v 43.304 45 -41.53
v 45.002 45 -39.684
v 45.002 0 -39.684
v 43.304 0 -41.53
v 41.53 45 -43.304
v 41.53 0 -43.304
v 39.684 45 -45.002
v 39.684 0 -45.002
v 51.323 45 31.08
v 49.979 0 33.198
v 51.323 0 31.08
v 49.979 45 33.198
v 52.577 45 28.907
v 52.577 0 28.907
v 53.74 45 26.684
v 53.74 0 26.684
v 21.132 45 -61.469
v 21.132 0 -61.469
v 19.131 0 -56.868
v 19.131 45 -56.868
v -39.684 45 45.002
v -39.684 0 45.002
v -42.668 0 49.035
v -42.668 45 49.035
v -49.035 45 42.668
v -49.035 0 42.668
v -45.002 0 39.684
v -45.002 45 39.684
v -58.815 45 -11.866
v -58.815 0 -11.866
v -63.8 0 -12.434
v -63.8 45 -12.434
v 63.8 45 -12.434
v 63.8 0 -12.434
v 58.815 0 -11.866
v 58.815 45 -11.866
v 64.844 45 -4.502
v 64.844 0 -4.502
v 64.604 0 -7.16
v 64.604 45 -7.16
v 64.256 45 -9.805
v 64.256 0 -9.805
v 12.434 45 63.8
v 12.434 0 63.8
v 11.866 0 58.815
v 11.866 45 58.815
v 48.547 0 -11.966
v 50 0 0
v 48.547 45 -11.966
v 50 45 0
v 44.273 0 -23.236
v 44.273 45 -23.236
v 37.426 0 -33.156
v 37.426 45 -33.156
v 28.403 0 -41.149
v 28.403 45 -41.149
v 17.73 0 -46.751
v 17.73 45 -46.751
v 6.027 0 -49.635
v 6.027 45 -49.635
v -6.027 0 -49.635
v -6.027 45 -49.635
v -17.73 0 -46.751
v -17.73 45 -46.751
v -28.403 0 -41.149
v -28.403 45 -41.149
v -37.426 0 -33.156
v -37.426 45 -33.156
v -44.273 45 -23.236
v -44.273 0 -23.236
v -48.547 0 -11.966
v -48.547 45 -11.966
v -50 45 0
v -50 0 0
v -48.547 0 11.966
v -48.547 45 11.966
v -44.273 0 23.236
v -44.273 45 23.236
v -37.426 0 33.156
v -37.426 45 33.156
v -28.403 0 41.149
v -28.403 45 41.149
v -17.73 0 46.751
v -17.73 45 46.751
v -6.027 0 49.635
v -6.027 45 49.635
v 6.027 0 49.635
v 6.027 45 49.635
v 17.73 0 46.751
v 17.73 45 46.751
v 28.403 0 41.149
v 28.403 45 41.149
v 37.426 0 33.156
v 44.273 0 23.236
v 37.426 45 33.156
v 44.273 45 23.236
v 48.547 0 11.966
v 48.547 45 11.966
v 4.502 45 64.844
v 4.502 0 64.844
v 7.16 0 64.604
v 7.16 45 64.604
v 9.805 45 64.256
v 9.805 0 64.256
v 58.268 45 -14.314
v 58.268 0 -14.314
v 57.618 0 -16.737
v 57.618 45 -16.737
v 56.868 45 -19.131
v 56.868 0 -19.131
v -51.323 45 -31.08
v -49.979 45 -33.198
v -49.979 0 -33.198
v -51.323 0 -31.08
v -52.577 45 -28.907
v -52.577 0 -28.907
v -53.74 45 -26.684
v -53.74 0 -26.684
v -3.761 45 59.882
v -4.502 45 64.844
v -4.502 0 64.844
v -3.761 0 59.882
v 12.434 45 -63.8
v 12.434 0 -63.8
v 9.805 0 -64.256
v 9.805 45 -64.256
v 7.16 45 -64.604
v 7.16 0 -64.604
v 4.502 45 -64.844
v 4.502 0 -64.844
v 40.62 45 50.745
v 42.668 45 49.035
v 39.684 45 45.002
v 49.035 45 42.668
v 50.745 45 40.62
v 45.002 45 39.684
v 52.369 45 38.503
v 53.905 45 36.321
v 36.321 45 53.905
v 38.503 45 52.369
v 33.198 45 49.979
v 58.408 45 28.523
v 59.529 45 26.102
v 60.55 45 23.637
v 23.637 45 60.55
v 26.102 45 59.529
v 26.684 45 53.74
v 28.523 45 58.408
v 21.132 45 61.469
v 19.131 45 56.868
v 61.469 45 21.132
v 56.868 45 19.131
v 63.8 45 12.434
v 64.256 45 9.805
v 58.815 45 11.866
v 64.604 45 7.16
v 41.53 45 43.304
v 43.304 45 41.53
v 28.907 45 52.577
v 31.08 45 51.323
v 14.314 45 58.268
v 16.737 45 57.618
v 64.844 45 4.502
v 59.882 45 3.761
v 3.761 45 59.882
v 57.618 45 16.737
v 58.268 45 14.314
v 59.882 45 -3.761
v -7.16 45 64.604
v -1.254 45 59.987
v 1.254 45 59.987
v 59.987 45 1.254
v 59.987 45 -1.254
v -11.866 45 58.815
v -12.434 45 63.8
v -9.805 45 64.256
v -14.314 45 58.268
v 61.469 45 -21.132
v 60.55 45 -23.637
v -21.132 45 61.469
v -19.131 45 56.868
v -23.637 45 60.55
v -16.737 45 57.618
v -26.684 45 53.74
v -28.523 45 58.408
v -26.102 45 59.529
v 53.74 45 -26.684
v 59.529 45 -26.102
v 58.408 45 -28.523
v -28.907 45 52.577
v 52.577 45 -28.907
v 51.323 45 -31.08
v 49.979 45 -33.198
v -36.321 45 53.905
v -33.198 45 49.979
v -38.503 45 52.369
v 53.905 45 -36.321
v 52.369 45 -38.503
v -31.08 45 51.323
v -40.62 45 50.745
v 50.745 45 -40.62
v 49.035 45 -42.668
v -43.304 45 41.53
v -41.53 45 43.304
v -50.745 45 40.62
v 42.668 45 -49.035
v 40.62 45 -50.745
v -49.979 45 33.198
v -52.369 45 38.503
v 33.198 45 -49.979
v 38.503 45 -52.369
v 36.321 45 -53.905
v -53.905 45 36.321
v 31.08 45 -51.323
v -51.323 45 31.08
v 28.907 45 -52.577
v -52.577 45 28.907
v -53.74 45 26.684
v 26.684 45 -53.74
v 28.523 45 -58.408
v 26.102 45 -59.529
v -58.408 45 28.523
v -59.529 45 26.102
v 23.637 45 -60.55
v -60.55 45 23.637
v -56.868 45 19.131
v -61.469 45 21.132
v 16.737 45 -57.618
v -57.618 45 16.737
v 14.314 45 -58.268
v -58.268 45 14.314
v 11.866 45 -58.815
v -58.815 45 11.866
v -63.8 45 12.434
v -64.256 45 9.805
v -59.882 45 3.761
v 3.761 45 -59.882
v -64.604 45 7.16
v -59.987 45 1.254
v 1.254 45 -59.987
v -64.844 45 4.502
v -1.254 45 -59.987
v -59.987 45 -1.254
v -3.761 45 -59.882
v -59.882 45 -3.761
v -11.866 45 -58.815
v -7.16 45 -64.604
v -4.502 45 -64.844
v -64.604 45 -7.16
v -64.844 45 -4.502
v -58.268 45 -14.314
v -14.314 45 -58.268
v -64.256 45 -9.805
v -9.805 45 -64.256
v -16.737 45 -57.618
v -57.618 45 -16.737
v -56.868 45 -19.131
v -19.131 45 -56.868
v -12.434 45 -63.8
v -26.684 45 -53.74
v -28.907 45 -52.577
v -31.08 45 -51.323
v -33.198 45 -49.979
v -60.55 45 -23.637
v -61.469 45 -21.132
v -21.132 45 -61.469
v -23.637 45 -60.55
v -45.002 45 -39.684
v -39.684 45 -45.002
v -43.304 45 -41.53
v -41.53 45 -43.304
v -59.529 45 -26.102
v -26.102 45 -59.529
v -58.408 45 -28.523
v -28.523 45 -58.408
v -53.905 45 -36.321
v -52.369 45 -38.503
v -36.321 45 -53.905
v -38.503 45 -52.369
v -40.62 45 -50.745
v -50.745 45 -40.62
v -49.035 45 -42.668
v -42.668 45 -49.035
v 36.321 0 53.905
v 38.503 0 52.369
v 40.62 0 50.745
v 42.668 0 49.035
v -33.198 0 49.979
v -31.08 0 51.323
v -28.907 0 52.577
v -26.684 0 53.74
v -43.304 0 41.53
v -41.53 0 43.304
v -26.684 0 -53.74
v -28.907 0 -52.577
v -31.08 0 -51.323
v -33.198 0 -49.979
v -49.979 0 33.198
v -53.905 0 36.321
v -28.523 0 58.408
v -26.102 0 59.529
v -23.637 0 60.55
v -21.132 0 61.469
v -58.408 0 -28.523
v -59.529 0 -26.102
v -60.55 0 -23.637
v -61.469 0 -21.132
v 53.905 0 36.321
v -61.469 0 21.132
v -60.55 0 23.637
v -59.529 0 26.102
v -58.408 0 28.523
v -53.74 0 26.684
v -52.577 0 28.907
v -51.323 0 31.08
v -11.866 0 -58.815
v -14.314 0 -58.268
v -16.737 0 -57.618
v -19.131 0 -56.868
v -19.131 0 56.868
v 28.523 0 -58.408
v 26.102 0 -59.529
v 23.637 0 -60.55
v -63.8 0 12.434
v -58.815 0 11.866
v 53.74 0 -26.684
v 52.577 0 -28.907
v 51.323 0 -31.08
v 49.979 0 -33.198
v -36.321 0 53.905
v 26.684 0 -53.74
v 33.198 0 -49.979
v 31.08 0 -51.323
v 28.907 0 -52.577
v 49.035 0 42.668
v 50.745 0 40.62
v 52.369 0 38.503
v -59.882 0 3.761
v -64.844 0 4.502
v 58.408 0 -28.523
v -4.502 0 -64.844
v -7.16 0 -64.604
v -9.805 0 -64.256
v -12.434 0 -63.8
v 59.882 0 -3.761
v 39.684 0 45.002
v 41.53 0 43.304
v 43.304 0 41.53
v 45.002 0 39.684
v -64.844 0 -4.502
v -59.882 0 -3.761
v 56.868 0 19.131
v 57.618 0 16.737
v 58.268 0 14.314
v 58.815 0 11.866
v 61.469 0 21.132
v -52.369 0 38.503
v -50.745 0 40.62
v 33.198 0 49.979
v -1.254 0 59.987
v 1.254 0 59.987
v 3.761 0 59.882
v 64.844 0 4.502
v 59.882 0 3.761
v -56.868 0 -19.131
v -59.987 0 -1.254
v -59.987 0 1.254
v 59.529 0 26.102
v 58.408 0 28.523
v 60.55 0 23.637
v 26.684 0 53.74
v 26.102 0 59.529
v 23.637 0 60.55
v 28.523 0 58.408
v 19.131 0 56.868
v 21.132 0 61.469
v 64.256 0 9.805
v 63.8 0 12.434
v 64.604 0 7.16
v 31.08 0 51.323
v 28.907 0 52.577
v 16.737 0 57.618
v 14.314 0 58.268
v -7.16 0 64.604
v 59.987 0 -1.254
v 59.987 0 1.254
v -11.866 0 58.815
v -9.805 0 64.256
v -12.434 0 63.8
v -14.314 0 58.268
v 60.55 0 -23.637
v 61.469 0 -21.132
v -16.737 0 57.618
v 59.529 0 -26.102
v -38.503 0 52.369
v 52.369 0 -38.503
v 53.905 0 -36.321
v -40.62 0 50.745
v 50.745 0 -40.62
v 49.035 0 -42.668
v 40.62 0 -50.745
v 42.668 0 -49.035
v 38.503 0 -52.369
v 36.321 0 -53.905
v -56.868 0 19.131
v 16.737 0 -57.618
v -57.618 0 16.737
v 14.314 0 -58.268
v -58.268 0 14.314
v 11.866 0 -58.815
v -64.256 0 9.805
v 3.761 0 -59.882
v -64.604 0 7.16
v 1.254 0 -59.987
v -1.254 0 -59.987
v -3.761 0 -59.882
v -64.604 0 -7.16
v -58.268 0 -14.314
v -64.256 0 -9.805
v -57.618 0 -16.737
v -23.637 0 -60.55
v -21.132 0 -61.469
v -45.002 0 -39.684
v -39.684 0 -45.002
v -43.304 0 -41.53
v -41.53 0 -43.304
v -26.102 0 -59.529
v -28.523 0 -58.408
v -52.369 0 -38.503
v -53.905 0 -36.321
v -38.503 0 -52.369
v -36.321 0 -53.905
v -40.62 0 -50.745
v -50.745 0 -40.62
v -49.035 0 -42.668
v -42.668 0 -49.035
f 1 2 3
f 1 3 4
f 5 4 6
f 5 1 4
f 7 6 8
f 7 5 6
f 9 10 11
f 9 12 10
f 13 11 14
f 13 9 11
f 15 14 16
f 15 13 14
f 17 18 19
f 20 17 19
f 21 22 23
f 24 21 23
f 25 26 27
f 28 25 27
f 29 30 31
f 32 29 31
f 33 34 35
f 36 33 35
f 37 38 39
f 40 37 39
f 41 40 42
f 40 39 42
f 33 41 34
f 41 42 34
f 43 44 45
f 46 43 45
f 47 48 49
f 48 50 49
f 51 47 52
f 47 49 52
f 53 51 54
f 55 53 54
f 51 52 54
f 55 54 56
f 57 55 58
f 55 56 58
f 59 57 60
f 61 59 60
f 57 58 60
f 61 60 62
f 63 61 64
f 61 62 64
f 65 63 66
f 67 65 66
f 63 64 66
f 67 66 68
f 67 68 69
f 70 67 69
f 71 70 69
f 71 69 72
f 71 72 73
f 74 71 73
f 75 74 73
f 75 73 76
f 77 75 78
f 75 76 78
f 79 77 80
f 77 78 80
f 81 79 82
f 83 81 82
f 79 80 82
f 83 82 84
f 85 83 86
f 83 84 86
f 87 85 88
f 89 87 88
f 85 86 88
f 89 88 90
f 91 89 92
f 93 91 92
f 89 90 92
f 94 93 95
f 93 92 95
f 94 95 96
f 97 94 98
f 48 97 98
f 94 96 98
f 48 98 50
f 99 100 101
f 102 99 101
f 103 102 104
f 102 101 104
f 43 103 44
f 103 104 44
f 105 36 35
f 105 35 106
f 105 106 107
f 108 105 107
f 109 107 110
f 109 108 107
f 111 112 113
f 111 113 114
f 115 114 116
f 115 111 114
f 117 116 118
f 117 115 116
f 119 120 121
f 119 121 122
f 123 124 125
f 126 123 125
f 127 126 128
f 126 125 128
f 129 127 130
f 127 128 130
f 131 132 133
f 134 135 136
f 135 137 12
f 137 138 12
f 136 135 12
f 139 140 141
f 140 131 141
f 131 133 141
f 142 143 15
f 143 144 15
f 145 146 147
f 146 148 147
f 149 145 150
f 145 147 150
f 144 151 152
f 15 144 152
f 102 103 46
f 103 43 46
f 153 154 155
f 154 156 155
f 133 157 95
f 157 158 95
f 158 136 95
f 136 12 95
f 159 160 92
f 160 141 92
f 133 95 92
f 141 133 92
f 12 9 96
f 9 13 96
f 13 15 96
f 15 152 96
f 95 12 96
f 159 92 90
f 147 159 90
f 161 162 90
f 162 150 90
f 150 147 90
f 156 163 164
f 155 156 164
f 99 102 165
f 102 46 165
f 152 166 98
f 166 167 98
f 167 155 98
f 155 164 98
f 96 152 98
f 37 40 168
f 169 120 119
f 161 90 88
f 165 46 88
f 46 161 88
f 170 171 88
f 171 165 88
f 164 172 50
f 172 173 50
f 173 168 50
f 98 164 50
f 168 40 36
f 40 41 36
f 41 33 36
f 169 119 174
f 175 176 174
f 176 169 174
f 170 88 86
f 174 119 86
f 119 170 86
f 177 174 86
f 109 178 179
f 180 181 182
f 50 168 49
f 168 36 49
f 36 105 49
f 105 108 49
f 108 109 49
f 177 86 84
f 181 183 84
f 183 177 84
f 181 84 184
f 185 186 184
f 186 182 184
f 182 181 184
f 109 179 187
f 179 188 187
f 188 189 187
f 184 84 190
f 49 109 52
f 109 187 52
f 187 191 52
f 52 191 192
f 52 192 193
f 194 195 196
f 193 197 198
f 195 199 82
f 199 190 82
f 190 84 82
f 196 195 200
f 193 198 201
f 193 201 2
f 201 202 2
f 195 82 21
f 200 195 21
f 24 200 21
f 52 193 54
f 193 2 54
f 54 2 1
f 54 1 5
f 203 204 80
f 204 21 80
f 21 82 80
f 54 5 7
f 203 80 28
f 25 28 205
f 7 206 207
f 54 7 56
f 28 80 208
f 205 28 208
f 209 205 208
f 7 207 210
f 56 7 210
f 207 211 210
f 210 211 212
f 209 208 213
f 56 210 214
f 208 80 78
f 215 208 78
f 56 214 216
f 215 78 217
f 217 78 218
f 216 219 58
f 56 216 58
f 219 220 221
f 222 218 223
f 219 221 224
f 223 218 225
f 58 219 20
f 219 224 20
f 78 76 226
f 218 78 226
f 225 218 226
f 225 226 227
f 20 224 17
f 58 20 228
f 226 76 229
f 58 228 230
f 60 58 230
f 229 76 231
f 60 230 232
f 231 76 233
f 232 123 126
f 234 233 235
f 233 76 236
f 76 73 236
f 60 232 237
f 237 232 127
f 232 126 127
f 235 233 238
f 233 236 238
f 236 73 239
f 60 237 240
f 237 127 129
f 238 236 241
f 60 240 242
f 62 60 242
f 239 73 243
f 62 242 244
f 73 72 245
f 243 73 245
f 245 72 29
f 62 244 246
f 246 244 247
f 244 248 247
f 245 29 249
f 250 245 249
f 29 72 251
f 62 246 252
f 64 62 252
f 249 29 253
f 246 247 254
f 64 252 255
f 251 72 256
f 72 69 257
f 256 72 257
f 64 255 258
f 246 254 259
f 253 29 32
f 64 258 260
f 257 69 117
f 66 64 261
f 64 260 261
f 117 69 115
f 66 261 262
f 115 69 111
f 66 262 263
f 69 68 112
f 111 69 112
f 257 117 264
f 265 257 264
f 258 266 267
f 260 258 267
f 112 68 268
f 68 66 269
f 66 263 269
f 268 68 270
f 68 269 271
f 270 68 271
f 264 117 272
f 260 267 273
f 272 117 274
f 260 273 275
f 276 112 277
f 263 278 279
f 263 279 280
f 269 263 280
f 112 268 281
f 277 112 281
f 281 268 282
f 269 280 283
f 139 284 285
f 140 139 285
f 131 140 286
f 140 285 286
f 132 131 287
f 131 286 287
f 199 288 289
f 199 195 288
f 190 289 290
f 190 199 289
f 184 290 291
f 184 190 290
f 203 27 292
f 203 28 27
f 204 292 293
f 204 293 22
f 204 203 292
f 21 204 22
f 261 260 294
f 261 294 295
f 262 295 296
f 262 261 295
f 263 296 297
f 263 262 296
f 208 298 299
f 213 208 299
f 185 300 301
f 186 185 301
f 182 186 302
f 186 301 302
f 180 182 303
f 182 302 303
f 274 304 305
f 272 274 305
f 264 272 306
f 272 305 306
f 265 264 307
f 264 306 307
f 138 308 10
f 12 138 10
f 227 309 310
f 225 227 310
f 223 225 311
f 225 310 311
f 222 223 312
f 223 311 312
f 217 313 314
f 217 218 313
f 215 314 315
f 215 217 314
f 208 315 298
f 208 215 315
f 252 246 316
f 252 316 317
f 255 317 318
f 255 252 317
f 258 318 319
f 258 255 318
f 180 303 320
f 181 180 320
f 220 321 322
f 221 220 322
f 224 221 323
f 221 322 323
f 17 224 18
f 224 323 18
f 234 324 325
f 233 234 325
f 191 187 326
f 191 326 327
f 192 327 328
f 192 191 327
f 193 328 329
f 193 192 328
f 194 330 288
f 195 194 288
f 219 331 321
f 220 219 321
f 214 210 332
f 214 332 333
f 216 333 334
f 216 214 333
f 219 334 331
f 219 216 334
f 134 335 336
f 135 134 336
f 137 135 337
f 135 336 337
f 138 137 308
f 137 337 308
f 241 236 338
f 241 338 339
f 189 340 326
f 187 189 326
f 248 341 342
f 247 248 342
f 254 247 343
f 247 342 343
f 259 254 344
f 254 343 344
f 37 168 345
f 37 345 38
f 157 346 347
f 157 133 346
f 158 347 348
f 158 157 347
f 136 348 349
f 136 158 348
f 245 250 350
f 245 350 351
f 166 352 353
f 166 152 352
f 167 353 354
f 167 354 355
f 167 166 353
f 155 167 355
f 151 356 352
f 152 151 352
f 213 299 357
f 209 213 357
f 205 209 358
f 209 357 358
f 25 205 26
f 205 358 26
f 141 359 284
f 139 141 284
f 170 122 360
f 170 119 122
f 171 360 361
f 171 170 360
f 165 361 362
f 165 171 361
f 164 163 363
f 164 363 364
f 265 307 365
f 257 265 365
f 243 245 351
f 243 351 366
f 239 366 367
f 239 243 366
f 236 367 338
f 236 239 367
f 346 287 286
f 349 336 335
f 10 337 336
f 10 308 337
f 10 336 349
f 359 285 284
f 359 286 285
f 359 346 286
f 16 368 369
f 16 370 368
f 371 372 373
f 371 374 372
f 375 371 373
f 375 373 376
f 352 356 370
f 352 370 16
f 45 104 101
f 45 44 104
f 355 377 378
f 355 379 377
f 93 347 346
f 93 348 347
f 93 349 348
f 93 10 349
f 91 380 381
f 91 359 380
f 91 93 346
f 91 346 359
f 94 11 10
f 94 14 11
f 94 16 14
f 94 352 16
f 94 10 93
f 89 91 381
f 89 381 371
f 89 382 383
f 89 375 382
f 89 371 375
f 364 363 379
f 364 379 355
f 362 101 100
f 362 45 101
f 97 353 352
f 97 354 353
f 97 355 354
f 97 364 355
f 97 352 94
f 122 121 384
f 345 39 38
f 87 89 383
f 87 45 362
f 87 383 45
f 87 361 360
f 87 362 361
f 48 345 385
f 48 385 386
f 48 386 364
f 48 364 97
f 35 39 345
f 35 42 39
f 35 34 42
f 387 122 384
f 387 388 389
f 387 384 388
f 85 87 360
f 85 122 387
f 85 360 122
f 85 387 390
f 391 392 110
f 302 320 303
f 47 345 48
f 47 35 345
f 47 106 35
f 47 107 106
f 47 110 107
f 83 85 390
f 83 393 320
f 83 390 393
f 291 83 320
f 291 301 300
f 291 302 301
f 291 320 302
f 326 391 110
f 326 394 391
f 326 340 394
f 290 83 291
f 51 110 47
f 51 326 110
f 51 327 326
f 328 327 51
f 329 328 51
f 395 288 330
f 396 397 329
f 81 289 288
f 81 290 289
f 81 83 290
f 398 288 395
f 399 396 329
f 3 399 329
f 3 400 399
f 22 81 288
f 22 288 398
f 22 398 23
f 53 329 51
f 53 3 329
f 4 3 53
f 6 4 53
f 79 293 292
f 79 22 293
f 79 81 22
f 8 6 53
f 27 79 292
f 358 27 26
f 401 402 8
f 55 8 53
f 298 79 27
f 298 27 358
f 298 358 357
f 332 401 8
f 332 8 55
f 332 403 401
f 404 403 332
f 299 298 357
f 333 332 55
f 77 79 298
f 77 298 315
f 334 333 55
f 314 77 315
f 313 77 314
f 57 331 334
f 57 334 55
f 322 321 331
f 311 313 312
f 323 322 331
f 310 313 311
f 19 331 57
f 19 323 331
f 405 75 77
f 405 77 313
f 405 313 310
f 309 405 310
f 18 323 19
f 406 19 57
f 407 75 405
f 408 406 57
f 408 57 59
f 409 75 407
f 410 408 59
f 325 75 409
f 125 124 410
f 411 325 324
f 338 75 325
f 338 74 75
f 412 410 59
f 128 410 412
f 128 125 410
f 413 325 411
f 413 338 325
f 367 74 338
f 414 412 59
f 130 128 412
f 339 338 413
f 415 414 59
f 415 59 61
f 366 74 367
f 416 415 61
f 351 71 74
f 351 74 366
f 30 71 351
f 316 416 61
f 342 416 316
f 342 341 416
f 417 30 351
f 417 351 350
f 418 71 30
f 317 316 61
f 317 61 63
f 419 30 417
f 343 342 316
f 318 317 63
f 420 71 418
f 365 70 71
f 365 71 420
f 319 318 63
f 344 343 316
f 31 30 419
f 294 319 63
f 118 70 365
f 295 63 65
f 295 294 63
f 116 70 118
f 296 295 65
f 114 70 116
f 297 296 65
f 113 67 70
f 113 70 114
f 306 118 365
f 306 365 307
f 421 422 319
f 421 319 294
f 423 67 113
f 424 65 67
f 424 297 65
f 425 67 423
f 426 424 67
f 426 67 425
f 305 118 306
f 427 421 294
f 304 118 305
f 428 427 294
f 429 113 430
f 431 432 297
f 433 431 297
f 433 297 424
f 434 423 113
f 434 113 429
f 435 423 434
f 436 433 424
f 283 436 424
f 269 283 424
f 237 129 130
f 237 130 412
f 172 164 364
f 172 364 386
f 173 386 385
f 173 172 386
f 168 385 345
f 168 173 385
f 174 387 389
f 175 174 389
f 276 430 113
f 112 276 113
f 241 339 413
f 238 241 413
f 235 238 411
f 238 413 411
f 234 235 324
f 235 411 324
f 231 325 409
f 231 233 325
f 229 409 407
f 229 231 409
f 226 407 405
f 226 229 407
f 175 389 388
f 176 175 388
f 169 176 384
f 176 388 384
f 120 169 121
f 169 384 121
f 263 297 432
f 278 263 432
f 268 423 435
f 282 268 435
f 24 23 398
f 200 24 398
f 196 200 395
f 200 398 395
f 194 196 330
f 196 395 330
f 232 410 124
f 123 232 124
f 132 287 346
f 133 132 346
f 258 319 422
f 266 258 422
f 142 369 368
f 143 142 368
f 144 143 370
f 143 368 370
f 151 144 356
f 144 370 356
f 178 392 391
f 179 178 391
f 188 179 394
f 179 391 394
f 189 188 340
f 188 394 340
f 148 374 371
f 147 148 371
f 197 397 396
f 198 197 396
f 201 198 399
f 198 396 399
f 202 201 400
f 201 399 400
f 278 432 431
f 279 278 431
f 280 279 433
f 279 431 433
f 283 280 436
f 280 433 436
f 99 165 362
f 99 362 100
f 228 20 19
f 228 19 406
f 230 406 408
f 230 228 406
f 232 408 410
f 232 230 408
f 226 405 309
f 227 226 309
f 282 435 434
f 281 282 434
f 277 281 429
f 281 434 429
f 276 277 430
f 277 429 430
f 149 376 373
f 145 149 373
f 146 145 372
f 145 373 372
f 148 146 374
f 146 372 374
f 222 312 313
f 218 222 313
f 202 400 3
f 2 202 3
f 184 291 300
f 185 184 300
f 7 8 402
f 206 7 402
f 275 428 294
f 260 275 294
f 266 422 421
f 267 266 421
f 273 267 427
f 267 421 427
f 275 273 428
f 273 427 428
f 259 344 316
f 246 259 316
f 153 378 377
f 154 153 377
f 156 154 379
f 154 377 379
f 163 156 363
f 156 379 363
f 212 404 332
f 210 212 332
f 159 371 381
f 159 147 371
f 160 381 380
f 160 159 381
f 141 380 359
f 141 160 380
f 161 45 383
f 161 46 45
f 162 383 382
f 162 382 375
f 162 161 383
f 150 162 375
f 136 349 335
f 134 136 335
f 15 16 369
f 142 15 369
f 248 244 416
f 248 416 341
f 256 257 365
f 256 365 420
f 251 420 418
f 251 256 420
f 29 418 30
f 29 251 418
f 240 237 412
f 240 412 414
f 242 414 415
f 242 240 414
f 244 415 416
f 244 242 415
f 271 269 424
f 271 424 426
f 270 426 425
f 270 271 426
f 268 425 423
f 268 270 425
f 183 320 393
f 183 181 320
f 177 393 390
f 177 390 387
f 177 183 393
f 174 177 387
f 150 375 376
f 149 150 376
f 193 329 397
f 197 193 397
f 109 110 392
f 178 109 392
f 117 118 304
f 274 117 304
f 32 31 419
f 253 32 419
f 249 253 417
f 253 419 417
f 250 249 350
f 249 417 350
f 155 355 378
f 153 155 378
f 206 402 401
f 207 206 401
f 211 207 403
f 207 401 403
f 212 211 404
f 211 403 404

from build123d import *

# Parameters (mm, degrees)
SKETCH2_W           = 10
SKETCH2_H           = 45
BOSS_EXTRUDE1_DEPTH = 45


with BuildPart() as part:
    # Sketch2 → Revolve1 (revolve)
    with BuildSketch(Plane.XY):
        with Locations((55, 22.5)):
            Rectangle(SKETCH2_W, SKETCH2_H)
    revolve(axis=Axis((0, -1000, 0), (0, 1, 0)))

    # Sketch3 → Boss-Extrude1 (add)
    with BuildSketch(Plane(origin=(0, 0, 0), x_dir=(1, 0, 0), z_dir=(0, 1, 0))):
        with BuildLine():
            Line((4.502343049, 64.84388103), (3.76078814, 59.88202128))
            ThreePointArc((3.76078814, 59.88202128), (7.831571533, 59.486691682), (11.865965175, 58.81495448))
            Line((11.865965175, 58.81495448), (12.43390194, 63.799671493))
            ThreePointArc((12.43390194, 63.799671493), (8.484202494, 64.443915989), (4.502343049, 64.84388103))
        make_face()
        with BuildLine():
            Line((21.131760798, 61.469087235), (19.131249958, 56.868227289))
            ThreePointArc((19.131249958, 56.868227289), (22.961005942, 55.432771951), (26.684072572, 53.739745728))
            Line((26.684072572, 53.739745728), (28.522797059, 58.407619777))
            ThreePointArc((28.522797059, 58.407619777), (24.874423104, 60.052169613), (21.131760798, 61.469087235))
        make_face()
        with BuildLine():
            Line((36.321083972, 53.905276728), (33.197948708, 49.978957588))
            ThreePointArc((33.197948708, 49.978957588), (36.525685741, 47.601200417), (39.683704522, 45.002262115))
            Line((39.683704522, 45.002262115), (42.667910694, 49.035185296))
            ThreePointArc((42.667910694, 49.035185296), (39.569492886, 51.567967119), (36.321083972, 53.905276728))
        make_face()
        with BuildLine():
            Line((49.035185296, 42.667910694), (45.002262115, 39.683704522))
            ThreePointArc((45.002262115, 39.683704522), (47.601200417, 36.525685741), (49.978957588, 33.197948708))
            Line((49.978957588, 33.197948708), (53.905276728, 36.321083972))
            ThreePointArc((53.905276728, 36.321083972), (51.567967119, 39.569492886), (49.035185296, 42.667910694))
        make_face()
        with BuildLine():
            Line((58.407619777, 28.522797059), (53.739745728, 26.684072572))
            ThreePointArc((53.739745728, 26.684072572), (55.432771951, 22.961005942), (56.868227289, 19.131249958))
            Line((56.868227289, 19.131249958), (61.469087235, 21.131760798))
            ThreePointArc((61.469087235, 21.131760798), (60.052169613, 24.874423104), (58.407619777, 28.522797059))
        make_face()
        with BuildLine():
            Line((63.799671493, 12.43390194), (58.81495448, 11.865965175))
            ThreePointArc((58.81495448, 11.865965175), (59.486691682, 7.831571533), (59.88202128, 3.76078814))
            Line((59.88202128, 3.76078814), (64.84388103, 4.502343049))
            ThreePointArc((64.84388103, 4.502343049), (64.443915989, 8.484202494), (63.799671493, 12.43390194))
        make_face()
        with BuildLine():
            Line((64.84388103, -4.502343049), (59.88202128, -3.76078814))
            ThreePointArc((59.88202128, -3.76078814), (59.486691682, -7.831571533), (58.81495448, -11.865965175))
            Line((58.81495448, -11.865965175), (63.799671493, -12.43390194))
            ThreePointArc((63.799671493, -12.43390194), (64.443915989, -8.484202494), (64.84388103, -4.502343049))
        make_face()
        with BuildLine():
            Line((61.469087235, -21.131760798), (56.868227289, -19.131249958))
            ThreePointArc((56.868227289, -19.131249958), (55.432771951, -22.961005942), (53.739745728, -26.684072572))
            Line((53.739745728, -26.684072572), (58.407619777, -28.522797059))
            ThreePointArc((58.407619777, -28.522797059), (60.052169613, -24.874423104), (61.469087235, -21.131760798))
        make_face()
        with BuildLine():
            Line((53.905276728, -36.321083972), (49.978957588, -33.197948708))
            ThreePointArc((49.978957588, -33.197948708), (47.601200417, -36.525685741), (45.002262115, -39.683704522))
            Line((45.002262115, -39.683704522), (49.035185296, -42.667910694))
            ThreePointArc((49.035185296, -42.667910694), (51.567967119, -39.569492886), (53.905276728, -36.321083972))
        make_face()
        with BuildLine():
            Line((42.667910694, -49.035185296), (39.683704522, -45.002262115))
            ThreePointArc((39.683704522, -45.002262115), (36.525685741, -47.601200417), (33.197948708, -49.978957588))
            Line((33.197948708, -49.978957588), (36.321083972, -53.905276728))
            ThreePointArc((36.321083972, -53.905276728), (39.569492886, -51.567967119), (42.667910694, -49.035185296))
        make_face()
        with BuildLine():
            Line((28.522797059, -58.407619777), (26.684072572, -53.739745728))
            ThreePointArc((26.684072572, -53.739745728), (22.961005942, -55.432771951), (19.131249958, -56.868227289))
            Line((19.131249958, -56.868227289), (21.131760798, -61.469087235))
            ThreePointArc((21.131760798, -61.469087235), (24.874423104, -60.052169613), (28.522797059, -58.407619777))
        make_face()
        with BuildLine():
            Line((12.43390194, -63.799671493), (11.865965175, -58.81495448))
            ThreePointArc((11.865965175, -58.81495448), (7.831571533, -59.486691682), (3.76078814, -59.88202128))
            Line((3.76078814, -59.88202128), (4.502343049, -64.84388103))
            ThreePointArc((4.502343049, -64.84388103), (8.484202494, -64.443915989), (12.43390194, -63.799671493))
        make_face()
        with BuildLine():
            Line((-4.502343049, -64.84388103), (-3.76078814, -59.88202128))
            ThreePointArc((-3.76078814, -59.88202128), (-7.831571533, -59.486691682), (-11.865965175, -58.81495448))
            Line((-11.865965175, -58.81495448), (-12.43390194, -63.799671493))
            ThreePointArc((-12.43390194, -63.799671493), (-8.484202494, -64.443915989), (-4.502343049, -64.84388103))
        make_face()
        with BuildLine():
            Line((-21.131760798, -61.469087235), (-19.131249958, -56.868227289))
            ThreePointArc((-19.131249958, -56.868227289), (-22.961005942, -55.432771951), (-26.684072572, -53.739745728))
            Line((-26.684072572, -53.739745728), (-28.522797059, -58.407619777))
            ThreePointArc((-28.522797059, -58.407619777), (-24.874423104, -60.052169613), (-21.131760798, -61.469087235))
        make_face()
        with BuildLine():
            Line((-36.321083972, -53.905276728), (-33.197948708, -49.978957588))
            ThreePointArc((-33.197948708, -49.978957588), (-36.525685741, -47.601200417), (-39.683704522, -45.002262115))
            Line((-39.683704522, -45.002262115), (-42.667910694, -49.035185296))
            ThreePointArc((-42.667910694, -49.035185296), (-39.569492886, -51.567967119), (-36.321083972, -53.905276728))
        make_face()
        with BuildLine():
            Line((-49.035185296, -42.667910694), (-45.002262115, -39.683704522))
            ThreePointArc((-45.002262115, -39.683704522), (-47.601200417, -36.525685741), (-49.978957588, -33.197948708))
            Line((-49.978957588, -33.197948708), (-53.905276728, -36.321083972))
            ThreePointArc((-53.905276728, -36.321083972), (-51.567967119, -39.569492886), (-49.035185296, -42.667910694))
        make_face()
        with BuildLine():
            Line((-58.407619777, -28.522797059), (-53.739745728, -26.684072572))
            ThreePointArc((-53.739745728, -26.684072572), (-55.432771951, -22.961005942), (-56.868227289, -19.131249958))
            Line((-56.868227289, -19.131249958), (-61.469087235, -21.131760798))
            ThreePointArc((-61.469087235, -21.131760798), (-60.052169613, -24.874423104), (-58.407619777, -28.522797059))
        make_face()
        with BuildLine():
            Line((-63.799671493, -12.43390194), (-58.81495448, -11.865965175))
            ThreePointArc((-58.81495448, -11.865965175), (-59.486691682, -7.831571533), (-59.88202128, -3.76078814))
            Line((-59.88202128, -3.76078814), (-64.84388103, -4.502343049))
            ThreePointArc((-64.84388103, -4.502343049), (-64.443915989, -8.484202494), (-63.799671493, -12.43390194))
        make_face()
        with BuildLine():
            Line((-64.84388103, 4.502343049), (-59.88202128, 3.76078814))
            ThreePointArc((-59.88202128, 3.76078814), (-59.486691682, 7.831571533), (-58.81495448, 11.865965175))
            Line((-58.81495448, 11.865965175), (-63.799671493, 12.43390194))
            ThreePointArc((-63.799671493, 12.43390194), (-64.443915989, 8.484202494), (-64.84388103, 4.502343049))
        make_face()
        with BuildLine():
            Line((-61.469087235, 21.131760798), (-56.868227289, 19.131249958))
            ThreePointArc((-56.868227289, 19.131249958), (-55.432771951, 22.961005942), (-53.739745728, 26.684072572))
            Line((-53.739745728, 26.684072572), (-58.407619777, 28.522797059))
            ThreePointArc((-58.407619777, 28.522797059), (-60.052169613, 24.874423104), (-61.469087235, 21.131760798))
        make_face()
        with BuildLine():
            Line((-53.905276728, 36.321083972), (-49.978957588, 33.197948708))
            ThreePointArc((-49.978957588, 33.197948708), (-47.601200417, 36.525685741), (-45.002262115, 39.683704522))
            Line((-45.002262115, 39.683704522), (-49.035185296, 42.667910694))
            ThreePointArc((-49.035185296, 42.667910694), (-51.567967119, 39.569492886), (-53.905276728, 36.321083972))
        make_face()
        with BuildLine():
            Line((-42.667910694, 49.035185296), (-39.683704522, 45.002262115))
            ThreePointArc((-39.683704522, 45.002262115), (-36.525685741, 47.601200417), (-33.197948708, 49.978957588))
            Line((-33.197948708, 49.978957588), (-36.321083972, 53.905276728))
            ThreePointArc((-36.321083972, 53.905276728), (-39.569492886, 51.567967119), (-42.667910694, 49.035185296))
        make_face()
        with BuildLine():
            Line((-28.522797059, 58.407619777), (-26.684072572, 53.739745728))
            ThreePointArc((-26.684072572, 53.739745728), (-22.961005942, 55.432771951), (-19.131249958, 56.868227289))
            Line((-19.131249958, 56.868227289), (-21.131760798, 61.469087235))
            ThreePointArc((-21.131760798, 61.469087235), (-24.874423104, 60.052169613), (-28.522797059, 58.407619777))
        make_face()
        with BuildLine():
            Line((-12.43390194, 63.799671493), (-11.865965175, 58.81495448))
            ThreePointArc((-11.865965175, 58.81495448), (-7.831571533, 59.486691682), (-3.76078814, 59.88202128))
            Line((-3.76078814, 59.88202128), (-4.502343049, 64.84388103))
            ThreePointArc((-4.502343049, 64.84388103), (-8.484202494, 64.443915989), (-12.43390194, 63.799671493))
        make_face()
    extrude(amount=BOSS_EXTRUDE1_DEPTH)


solid = part.part
